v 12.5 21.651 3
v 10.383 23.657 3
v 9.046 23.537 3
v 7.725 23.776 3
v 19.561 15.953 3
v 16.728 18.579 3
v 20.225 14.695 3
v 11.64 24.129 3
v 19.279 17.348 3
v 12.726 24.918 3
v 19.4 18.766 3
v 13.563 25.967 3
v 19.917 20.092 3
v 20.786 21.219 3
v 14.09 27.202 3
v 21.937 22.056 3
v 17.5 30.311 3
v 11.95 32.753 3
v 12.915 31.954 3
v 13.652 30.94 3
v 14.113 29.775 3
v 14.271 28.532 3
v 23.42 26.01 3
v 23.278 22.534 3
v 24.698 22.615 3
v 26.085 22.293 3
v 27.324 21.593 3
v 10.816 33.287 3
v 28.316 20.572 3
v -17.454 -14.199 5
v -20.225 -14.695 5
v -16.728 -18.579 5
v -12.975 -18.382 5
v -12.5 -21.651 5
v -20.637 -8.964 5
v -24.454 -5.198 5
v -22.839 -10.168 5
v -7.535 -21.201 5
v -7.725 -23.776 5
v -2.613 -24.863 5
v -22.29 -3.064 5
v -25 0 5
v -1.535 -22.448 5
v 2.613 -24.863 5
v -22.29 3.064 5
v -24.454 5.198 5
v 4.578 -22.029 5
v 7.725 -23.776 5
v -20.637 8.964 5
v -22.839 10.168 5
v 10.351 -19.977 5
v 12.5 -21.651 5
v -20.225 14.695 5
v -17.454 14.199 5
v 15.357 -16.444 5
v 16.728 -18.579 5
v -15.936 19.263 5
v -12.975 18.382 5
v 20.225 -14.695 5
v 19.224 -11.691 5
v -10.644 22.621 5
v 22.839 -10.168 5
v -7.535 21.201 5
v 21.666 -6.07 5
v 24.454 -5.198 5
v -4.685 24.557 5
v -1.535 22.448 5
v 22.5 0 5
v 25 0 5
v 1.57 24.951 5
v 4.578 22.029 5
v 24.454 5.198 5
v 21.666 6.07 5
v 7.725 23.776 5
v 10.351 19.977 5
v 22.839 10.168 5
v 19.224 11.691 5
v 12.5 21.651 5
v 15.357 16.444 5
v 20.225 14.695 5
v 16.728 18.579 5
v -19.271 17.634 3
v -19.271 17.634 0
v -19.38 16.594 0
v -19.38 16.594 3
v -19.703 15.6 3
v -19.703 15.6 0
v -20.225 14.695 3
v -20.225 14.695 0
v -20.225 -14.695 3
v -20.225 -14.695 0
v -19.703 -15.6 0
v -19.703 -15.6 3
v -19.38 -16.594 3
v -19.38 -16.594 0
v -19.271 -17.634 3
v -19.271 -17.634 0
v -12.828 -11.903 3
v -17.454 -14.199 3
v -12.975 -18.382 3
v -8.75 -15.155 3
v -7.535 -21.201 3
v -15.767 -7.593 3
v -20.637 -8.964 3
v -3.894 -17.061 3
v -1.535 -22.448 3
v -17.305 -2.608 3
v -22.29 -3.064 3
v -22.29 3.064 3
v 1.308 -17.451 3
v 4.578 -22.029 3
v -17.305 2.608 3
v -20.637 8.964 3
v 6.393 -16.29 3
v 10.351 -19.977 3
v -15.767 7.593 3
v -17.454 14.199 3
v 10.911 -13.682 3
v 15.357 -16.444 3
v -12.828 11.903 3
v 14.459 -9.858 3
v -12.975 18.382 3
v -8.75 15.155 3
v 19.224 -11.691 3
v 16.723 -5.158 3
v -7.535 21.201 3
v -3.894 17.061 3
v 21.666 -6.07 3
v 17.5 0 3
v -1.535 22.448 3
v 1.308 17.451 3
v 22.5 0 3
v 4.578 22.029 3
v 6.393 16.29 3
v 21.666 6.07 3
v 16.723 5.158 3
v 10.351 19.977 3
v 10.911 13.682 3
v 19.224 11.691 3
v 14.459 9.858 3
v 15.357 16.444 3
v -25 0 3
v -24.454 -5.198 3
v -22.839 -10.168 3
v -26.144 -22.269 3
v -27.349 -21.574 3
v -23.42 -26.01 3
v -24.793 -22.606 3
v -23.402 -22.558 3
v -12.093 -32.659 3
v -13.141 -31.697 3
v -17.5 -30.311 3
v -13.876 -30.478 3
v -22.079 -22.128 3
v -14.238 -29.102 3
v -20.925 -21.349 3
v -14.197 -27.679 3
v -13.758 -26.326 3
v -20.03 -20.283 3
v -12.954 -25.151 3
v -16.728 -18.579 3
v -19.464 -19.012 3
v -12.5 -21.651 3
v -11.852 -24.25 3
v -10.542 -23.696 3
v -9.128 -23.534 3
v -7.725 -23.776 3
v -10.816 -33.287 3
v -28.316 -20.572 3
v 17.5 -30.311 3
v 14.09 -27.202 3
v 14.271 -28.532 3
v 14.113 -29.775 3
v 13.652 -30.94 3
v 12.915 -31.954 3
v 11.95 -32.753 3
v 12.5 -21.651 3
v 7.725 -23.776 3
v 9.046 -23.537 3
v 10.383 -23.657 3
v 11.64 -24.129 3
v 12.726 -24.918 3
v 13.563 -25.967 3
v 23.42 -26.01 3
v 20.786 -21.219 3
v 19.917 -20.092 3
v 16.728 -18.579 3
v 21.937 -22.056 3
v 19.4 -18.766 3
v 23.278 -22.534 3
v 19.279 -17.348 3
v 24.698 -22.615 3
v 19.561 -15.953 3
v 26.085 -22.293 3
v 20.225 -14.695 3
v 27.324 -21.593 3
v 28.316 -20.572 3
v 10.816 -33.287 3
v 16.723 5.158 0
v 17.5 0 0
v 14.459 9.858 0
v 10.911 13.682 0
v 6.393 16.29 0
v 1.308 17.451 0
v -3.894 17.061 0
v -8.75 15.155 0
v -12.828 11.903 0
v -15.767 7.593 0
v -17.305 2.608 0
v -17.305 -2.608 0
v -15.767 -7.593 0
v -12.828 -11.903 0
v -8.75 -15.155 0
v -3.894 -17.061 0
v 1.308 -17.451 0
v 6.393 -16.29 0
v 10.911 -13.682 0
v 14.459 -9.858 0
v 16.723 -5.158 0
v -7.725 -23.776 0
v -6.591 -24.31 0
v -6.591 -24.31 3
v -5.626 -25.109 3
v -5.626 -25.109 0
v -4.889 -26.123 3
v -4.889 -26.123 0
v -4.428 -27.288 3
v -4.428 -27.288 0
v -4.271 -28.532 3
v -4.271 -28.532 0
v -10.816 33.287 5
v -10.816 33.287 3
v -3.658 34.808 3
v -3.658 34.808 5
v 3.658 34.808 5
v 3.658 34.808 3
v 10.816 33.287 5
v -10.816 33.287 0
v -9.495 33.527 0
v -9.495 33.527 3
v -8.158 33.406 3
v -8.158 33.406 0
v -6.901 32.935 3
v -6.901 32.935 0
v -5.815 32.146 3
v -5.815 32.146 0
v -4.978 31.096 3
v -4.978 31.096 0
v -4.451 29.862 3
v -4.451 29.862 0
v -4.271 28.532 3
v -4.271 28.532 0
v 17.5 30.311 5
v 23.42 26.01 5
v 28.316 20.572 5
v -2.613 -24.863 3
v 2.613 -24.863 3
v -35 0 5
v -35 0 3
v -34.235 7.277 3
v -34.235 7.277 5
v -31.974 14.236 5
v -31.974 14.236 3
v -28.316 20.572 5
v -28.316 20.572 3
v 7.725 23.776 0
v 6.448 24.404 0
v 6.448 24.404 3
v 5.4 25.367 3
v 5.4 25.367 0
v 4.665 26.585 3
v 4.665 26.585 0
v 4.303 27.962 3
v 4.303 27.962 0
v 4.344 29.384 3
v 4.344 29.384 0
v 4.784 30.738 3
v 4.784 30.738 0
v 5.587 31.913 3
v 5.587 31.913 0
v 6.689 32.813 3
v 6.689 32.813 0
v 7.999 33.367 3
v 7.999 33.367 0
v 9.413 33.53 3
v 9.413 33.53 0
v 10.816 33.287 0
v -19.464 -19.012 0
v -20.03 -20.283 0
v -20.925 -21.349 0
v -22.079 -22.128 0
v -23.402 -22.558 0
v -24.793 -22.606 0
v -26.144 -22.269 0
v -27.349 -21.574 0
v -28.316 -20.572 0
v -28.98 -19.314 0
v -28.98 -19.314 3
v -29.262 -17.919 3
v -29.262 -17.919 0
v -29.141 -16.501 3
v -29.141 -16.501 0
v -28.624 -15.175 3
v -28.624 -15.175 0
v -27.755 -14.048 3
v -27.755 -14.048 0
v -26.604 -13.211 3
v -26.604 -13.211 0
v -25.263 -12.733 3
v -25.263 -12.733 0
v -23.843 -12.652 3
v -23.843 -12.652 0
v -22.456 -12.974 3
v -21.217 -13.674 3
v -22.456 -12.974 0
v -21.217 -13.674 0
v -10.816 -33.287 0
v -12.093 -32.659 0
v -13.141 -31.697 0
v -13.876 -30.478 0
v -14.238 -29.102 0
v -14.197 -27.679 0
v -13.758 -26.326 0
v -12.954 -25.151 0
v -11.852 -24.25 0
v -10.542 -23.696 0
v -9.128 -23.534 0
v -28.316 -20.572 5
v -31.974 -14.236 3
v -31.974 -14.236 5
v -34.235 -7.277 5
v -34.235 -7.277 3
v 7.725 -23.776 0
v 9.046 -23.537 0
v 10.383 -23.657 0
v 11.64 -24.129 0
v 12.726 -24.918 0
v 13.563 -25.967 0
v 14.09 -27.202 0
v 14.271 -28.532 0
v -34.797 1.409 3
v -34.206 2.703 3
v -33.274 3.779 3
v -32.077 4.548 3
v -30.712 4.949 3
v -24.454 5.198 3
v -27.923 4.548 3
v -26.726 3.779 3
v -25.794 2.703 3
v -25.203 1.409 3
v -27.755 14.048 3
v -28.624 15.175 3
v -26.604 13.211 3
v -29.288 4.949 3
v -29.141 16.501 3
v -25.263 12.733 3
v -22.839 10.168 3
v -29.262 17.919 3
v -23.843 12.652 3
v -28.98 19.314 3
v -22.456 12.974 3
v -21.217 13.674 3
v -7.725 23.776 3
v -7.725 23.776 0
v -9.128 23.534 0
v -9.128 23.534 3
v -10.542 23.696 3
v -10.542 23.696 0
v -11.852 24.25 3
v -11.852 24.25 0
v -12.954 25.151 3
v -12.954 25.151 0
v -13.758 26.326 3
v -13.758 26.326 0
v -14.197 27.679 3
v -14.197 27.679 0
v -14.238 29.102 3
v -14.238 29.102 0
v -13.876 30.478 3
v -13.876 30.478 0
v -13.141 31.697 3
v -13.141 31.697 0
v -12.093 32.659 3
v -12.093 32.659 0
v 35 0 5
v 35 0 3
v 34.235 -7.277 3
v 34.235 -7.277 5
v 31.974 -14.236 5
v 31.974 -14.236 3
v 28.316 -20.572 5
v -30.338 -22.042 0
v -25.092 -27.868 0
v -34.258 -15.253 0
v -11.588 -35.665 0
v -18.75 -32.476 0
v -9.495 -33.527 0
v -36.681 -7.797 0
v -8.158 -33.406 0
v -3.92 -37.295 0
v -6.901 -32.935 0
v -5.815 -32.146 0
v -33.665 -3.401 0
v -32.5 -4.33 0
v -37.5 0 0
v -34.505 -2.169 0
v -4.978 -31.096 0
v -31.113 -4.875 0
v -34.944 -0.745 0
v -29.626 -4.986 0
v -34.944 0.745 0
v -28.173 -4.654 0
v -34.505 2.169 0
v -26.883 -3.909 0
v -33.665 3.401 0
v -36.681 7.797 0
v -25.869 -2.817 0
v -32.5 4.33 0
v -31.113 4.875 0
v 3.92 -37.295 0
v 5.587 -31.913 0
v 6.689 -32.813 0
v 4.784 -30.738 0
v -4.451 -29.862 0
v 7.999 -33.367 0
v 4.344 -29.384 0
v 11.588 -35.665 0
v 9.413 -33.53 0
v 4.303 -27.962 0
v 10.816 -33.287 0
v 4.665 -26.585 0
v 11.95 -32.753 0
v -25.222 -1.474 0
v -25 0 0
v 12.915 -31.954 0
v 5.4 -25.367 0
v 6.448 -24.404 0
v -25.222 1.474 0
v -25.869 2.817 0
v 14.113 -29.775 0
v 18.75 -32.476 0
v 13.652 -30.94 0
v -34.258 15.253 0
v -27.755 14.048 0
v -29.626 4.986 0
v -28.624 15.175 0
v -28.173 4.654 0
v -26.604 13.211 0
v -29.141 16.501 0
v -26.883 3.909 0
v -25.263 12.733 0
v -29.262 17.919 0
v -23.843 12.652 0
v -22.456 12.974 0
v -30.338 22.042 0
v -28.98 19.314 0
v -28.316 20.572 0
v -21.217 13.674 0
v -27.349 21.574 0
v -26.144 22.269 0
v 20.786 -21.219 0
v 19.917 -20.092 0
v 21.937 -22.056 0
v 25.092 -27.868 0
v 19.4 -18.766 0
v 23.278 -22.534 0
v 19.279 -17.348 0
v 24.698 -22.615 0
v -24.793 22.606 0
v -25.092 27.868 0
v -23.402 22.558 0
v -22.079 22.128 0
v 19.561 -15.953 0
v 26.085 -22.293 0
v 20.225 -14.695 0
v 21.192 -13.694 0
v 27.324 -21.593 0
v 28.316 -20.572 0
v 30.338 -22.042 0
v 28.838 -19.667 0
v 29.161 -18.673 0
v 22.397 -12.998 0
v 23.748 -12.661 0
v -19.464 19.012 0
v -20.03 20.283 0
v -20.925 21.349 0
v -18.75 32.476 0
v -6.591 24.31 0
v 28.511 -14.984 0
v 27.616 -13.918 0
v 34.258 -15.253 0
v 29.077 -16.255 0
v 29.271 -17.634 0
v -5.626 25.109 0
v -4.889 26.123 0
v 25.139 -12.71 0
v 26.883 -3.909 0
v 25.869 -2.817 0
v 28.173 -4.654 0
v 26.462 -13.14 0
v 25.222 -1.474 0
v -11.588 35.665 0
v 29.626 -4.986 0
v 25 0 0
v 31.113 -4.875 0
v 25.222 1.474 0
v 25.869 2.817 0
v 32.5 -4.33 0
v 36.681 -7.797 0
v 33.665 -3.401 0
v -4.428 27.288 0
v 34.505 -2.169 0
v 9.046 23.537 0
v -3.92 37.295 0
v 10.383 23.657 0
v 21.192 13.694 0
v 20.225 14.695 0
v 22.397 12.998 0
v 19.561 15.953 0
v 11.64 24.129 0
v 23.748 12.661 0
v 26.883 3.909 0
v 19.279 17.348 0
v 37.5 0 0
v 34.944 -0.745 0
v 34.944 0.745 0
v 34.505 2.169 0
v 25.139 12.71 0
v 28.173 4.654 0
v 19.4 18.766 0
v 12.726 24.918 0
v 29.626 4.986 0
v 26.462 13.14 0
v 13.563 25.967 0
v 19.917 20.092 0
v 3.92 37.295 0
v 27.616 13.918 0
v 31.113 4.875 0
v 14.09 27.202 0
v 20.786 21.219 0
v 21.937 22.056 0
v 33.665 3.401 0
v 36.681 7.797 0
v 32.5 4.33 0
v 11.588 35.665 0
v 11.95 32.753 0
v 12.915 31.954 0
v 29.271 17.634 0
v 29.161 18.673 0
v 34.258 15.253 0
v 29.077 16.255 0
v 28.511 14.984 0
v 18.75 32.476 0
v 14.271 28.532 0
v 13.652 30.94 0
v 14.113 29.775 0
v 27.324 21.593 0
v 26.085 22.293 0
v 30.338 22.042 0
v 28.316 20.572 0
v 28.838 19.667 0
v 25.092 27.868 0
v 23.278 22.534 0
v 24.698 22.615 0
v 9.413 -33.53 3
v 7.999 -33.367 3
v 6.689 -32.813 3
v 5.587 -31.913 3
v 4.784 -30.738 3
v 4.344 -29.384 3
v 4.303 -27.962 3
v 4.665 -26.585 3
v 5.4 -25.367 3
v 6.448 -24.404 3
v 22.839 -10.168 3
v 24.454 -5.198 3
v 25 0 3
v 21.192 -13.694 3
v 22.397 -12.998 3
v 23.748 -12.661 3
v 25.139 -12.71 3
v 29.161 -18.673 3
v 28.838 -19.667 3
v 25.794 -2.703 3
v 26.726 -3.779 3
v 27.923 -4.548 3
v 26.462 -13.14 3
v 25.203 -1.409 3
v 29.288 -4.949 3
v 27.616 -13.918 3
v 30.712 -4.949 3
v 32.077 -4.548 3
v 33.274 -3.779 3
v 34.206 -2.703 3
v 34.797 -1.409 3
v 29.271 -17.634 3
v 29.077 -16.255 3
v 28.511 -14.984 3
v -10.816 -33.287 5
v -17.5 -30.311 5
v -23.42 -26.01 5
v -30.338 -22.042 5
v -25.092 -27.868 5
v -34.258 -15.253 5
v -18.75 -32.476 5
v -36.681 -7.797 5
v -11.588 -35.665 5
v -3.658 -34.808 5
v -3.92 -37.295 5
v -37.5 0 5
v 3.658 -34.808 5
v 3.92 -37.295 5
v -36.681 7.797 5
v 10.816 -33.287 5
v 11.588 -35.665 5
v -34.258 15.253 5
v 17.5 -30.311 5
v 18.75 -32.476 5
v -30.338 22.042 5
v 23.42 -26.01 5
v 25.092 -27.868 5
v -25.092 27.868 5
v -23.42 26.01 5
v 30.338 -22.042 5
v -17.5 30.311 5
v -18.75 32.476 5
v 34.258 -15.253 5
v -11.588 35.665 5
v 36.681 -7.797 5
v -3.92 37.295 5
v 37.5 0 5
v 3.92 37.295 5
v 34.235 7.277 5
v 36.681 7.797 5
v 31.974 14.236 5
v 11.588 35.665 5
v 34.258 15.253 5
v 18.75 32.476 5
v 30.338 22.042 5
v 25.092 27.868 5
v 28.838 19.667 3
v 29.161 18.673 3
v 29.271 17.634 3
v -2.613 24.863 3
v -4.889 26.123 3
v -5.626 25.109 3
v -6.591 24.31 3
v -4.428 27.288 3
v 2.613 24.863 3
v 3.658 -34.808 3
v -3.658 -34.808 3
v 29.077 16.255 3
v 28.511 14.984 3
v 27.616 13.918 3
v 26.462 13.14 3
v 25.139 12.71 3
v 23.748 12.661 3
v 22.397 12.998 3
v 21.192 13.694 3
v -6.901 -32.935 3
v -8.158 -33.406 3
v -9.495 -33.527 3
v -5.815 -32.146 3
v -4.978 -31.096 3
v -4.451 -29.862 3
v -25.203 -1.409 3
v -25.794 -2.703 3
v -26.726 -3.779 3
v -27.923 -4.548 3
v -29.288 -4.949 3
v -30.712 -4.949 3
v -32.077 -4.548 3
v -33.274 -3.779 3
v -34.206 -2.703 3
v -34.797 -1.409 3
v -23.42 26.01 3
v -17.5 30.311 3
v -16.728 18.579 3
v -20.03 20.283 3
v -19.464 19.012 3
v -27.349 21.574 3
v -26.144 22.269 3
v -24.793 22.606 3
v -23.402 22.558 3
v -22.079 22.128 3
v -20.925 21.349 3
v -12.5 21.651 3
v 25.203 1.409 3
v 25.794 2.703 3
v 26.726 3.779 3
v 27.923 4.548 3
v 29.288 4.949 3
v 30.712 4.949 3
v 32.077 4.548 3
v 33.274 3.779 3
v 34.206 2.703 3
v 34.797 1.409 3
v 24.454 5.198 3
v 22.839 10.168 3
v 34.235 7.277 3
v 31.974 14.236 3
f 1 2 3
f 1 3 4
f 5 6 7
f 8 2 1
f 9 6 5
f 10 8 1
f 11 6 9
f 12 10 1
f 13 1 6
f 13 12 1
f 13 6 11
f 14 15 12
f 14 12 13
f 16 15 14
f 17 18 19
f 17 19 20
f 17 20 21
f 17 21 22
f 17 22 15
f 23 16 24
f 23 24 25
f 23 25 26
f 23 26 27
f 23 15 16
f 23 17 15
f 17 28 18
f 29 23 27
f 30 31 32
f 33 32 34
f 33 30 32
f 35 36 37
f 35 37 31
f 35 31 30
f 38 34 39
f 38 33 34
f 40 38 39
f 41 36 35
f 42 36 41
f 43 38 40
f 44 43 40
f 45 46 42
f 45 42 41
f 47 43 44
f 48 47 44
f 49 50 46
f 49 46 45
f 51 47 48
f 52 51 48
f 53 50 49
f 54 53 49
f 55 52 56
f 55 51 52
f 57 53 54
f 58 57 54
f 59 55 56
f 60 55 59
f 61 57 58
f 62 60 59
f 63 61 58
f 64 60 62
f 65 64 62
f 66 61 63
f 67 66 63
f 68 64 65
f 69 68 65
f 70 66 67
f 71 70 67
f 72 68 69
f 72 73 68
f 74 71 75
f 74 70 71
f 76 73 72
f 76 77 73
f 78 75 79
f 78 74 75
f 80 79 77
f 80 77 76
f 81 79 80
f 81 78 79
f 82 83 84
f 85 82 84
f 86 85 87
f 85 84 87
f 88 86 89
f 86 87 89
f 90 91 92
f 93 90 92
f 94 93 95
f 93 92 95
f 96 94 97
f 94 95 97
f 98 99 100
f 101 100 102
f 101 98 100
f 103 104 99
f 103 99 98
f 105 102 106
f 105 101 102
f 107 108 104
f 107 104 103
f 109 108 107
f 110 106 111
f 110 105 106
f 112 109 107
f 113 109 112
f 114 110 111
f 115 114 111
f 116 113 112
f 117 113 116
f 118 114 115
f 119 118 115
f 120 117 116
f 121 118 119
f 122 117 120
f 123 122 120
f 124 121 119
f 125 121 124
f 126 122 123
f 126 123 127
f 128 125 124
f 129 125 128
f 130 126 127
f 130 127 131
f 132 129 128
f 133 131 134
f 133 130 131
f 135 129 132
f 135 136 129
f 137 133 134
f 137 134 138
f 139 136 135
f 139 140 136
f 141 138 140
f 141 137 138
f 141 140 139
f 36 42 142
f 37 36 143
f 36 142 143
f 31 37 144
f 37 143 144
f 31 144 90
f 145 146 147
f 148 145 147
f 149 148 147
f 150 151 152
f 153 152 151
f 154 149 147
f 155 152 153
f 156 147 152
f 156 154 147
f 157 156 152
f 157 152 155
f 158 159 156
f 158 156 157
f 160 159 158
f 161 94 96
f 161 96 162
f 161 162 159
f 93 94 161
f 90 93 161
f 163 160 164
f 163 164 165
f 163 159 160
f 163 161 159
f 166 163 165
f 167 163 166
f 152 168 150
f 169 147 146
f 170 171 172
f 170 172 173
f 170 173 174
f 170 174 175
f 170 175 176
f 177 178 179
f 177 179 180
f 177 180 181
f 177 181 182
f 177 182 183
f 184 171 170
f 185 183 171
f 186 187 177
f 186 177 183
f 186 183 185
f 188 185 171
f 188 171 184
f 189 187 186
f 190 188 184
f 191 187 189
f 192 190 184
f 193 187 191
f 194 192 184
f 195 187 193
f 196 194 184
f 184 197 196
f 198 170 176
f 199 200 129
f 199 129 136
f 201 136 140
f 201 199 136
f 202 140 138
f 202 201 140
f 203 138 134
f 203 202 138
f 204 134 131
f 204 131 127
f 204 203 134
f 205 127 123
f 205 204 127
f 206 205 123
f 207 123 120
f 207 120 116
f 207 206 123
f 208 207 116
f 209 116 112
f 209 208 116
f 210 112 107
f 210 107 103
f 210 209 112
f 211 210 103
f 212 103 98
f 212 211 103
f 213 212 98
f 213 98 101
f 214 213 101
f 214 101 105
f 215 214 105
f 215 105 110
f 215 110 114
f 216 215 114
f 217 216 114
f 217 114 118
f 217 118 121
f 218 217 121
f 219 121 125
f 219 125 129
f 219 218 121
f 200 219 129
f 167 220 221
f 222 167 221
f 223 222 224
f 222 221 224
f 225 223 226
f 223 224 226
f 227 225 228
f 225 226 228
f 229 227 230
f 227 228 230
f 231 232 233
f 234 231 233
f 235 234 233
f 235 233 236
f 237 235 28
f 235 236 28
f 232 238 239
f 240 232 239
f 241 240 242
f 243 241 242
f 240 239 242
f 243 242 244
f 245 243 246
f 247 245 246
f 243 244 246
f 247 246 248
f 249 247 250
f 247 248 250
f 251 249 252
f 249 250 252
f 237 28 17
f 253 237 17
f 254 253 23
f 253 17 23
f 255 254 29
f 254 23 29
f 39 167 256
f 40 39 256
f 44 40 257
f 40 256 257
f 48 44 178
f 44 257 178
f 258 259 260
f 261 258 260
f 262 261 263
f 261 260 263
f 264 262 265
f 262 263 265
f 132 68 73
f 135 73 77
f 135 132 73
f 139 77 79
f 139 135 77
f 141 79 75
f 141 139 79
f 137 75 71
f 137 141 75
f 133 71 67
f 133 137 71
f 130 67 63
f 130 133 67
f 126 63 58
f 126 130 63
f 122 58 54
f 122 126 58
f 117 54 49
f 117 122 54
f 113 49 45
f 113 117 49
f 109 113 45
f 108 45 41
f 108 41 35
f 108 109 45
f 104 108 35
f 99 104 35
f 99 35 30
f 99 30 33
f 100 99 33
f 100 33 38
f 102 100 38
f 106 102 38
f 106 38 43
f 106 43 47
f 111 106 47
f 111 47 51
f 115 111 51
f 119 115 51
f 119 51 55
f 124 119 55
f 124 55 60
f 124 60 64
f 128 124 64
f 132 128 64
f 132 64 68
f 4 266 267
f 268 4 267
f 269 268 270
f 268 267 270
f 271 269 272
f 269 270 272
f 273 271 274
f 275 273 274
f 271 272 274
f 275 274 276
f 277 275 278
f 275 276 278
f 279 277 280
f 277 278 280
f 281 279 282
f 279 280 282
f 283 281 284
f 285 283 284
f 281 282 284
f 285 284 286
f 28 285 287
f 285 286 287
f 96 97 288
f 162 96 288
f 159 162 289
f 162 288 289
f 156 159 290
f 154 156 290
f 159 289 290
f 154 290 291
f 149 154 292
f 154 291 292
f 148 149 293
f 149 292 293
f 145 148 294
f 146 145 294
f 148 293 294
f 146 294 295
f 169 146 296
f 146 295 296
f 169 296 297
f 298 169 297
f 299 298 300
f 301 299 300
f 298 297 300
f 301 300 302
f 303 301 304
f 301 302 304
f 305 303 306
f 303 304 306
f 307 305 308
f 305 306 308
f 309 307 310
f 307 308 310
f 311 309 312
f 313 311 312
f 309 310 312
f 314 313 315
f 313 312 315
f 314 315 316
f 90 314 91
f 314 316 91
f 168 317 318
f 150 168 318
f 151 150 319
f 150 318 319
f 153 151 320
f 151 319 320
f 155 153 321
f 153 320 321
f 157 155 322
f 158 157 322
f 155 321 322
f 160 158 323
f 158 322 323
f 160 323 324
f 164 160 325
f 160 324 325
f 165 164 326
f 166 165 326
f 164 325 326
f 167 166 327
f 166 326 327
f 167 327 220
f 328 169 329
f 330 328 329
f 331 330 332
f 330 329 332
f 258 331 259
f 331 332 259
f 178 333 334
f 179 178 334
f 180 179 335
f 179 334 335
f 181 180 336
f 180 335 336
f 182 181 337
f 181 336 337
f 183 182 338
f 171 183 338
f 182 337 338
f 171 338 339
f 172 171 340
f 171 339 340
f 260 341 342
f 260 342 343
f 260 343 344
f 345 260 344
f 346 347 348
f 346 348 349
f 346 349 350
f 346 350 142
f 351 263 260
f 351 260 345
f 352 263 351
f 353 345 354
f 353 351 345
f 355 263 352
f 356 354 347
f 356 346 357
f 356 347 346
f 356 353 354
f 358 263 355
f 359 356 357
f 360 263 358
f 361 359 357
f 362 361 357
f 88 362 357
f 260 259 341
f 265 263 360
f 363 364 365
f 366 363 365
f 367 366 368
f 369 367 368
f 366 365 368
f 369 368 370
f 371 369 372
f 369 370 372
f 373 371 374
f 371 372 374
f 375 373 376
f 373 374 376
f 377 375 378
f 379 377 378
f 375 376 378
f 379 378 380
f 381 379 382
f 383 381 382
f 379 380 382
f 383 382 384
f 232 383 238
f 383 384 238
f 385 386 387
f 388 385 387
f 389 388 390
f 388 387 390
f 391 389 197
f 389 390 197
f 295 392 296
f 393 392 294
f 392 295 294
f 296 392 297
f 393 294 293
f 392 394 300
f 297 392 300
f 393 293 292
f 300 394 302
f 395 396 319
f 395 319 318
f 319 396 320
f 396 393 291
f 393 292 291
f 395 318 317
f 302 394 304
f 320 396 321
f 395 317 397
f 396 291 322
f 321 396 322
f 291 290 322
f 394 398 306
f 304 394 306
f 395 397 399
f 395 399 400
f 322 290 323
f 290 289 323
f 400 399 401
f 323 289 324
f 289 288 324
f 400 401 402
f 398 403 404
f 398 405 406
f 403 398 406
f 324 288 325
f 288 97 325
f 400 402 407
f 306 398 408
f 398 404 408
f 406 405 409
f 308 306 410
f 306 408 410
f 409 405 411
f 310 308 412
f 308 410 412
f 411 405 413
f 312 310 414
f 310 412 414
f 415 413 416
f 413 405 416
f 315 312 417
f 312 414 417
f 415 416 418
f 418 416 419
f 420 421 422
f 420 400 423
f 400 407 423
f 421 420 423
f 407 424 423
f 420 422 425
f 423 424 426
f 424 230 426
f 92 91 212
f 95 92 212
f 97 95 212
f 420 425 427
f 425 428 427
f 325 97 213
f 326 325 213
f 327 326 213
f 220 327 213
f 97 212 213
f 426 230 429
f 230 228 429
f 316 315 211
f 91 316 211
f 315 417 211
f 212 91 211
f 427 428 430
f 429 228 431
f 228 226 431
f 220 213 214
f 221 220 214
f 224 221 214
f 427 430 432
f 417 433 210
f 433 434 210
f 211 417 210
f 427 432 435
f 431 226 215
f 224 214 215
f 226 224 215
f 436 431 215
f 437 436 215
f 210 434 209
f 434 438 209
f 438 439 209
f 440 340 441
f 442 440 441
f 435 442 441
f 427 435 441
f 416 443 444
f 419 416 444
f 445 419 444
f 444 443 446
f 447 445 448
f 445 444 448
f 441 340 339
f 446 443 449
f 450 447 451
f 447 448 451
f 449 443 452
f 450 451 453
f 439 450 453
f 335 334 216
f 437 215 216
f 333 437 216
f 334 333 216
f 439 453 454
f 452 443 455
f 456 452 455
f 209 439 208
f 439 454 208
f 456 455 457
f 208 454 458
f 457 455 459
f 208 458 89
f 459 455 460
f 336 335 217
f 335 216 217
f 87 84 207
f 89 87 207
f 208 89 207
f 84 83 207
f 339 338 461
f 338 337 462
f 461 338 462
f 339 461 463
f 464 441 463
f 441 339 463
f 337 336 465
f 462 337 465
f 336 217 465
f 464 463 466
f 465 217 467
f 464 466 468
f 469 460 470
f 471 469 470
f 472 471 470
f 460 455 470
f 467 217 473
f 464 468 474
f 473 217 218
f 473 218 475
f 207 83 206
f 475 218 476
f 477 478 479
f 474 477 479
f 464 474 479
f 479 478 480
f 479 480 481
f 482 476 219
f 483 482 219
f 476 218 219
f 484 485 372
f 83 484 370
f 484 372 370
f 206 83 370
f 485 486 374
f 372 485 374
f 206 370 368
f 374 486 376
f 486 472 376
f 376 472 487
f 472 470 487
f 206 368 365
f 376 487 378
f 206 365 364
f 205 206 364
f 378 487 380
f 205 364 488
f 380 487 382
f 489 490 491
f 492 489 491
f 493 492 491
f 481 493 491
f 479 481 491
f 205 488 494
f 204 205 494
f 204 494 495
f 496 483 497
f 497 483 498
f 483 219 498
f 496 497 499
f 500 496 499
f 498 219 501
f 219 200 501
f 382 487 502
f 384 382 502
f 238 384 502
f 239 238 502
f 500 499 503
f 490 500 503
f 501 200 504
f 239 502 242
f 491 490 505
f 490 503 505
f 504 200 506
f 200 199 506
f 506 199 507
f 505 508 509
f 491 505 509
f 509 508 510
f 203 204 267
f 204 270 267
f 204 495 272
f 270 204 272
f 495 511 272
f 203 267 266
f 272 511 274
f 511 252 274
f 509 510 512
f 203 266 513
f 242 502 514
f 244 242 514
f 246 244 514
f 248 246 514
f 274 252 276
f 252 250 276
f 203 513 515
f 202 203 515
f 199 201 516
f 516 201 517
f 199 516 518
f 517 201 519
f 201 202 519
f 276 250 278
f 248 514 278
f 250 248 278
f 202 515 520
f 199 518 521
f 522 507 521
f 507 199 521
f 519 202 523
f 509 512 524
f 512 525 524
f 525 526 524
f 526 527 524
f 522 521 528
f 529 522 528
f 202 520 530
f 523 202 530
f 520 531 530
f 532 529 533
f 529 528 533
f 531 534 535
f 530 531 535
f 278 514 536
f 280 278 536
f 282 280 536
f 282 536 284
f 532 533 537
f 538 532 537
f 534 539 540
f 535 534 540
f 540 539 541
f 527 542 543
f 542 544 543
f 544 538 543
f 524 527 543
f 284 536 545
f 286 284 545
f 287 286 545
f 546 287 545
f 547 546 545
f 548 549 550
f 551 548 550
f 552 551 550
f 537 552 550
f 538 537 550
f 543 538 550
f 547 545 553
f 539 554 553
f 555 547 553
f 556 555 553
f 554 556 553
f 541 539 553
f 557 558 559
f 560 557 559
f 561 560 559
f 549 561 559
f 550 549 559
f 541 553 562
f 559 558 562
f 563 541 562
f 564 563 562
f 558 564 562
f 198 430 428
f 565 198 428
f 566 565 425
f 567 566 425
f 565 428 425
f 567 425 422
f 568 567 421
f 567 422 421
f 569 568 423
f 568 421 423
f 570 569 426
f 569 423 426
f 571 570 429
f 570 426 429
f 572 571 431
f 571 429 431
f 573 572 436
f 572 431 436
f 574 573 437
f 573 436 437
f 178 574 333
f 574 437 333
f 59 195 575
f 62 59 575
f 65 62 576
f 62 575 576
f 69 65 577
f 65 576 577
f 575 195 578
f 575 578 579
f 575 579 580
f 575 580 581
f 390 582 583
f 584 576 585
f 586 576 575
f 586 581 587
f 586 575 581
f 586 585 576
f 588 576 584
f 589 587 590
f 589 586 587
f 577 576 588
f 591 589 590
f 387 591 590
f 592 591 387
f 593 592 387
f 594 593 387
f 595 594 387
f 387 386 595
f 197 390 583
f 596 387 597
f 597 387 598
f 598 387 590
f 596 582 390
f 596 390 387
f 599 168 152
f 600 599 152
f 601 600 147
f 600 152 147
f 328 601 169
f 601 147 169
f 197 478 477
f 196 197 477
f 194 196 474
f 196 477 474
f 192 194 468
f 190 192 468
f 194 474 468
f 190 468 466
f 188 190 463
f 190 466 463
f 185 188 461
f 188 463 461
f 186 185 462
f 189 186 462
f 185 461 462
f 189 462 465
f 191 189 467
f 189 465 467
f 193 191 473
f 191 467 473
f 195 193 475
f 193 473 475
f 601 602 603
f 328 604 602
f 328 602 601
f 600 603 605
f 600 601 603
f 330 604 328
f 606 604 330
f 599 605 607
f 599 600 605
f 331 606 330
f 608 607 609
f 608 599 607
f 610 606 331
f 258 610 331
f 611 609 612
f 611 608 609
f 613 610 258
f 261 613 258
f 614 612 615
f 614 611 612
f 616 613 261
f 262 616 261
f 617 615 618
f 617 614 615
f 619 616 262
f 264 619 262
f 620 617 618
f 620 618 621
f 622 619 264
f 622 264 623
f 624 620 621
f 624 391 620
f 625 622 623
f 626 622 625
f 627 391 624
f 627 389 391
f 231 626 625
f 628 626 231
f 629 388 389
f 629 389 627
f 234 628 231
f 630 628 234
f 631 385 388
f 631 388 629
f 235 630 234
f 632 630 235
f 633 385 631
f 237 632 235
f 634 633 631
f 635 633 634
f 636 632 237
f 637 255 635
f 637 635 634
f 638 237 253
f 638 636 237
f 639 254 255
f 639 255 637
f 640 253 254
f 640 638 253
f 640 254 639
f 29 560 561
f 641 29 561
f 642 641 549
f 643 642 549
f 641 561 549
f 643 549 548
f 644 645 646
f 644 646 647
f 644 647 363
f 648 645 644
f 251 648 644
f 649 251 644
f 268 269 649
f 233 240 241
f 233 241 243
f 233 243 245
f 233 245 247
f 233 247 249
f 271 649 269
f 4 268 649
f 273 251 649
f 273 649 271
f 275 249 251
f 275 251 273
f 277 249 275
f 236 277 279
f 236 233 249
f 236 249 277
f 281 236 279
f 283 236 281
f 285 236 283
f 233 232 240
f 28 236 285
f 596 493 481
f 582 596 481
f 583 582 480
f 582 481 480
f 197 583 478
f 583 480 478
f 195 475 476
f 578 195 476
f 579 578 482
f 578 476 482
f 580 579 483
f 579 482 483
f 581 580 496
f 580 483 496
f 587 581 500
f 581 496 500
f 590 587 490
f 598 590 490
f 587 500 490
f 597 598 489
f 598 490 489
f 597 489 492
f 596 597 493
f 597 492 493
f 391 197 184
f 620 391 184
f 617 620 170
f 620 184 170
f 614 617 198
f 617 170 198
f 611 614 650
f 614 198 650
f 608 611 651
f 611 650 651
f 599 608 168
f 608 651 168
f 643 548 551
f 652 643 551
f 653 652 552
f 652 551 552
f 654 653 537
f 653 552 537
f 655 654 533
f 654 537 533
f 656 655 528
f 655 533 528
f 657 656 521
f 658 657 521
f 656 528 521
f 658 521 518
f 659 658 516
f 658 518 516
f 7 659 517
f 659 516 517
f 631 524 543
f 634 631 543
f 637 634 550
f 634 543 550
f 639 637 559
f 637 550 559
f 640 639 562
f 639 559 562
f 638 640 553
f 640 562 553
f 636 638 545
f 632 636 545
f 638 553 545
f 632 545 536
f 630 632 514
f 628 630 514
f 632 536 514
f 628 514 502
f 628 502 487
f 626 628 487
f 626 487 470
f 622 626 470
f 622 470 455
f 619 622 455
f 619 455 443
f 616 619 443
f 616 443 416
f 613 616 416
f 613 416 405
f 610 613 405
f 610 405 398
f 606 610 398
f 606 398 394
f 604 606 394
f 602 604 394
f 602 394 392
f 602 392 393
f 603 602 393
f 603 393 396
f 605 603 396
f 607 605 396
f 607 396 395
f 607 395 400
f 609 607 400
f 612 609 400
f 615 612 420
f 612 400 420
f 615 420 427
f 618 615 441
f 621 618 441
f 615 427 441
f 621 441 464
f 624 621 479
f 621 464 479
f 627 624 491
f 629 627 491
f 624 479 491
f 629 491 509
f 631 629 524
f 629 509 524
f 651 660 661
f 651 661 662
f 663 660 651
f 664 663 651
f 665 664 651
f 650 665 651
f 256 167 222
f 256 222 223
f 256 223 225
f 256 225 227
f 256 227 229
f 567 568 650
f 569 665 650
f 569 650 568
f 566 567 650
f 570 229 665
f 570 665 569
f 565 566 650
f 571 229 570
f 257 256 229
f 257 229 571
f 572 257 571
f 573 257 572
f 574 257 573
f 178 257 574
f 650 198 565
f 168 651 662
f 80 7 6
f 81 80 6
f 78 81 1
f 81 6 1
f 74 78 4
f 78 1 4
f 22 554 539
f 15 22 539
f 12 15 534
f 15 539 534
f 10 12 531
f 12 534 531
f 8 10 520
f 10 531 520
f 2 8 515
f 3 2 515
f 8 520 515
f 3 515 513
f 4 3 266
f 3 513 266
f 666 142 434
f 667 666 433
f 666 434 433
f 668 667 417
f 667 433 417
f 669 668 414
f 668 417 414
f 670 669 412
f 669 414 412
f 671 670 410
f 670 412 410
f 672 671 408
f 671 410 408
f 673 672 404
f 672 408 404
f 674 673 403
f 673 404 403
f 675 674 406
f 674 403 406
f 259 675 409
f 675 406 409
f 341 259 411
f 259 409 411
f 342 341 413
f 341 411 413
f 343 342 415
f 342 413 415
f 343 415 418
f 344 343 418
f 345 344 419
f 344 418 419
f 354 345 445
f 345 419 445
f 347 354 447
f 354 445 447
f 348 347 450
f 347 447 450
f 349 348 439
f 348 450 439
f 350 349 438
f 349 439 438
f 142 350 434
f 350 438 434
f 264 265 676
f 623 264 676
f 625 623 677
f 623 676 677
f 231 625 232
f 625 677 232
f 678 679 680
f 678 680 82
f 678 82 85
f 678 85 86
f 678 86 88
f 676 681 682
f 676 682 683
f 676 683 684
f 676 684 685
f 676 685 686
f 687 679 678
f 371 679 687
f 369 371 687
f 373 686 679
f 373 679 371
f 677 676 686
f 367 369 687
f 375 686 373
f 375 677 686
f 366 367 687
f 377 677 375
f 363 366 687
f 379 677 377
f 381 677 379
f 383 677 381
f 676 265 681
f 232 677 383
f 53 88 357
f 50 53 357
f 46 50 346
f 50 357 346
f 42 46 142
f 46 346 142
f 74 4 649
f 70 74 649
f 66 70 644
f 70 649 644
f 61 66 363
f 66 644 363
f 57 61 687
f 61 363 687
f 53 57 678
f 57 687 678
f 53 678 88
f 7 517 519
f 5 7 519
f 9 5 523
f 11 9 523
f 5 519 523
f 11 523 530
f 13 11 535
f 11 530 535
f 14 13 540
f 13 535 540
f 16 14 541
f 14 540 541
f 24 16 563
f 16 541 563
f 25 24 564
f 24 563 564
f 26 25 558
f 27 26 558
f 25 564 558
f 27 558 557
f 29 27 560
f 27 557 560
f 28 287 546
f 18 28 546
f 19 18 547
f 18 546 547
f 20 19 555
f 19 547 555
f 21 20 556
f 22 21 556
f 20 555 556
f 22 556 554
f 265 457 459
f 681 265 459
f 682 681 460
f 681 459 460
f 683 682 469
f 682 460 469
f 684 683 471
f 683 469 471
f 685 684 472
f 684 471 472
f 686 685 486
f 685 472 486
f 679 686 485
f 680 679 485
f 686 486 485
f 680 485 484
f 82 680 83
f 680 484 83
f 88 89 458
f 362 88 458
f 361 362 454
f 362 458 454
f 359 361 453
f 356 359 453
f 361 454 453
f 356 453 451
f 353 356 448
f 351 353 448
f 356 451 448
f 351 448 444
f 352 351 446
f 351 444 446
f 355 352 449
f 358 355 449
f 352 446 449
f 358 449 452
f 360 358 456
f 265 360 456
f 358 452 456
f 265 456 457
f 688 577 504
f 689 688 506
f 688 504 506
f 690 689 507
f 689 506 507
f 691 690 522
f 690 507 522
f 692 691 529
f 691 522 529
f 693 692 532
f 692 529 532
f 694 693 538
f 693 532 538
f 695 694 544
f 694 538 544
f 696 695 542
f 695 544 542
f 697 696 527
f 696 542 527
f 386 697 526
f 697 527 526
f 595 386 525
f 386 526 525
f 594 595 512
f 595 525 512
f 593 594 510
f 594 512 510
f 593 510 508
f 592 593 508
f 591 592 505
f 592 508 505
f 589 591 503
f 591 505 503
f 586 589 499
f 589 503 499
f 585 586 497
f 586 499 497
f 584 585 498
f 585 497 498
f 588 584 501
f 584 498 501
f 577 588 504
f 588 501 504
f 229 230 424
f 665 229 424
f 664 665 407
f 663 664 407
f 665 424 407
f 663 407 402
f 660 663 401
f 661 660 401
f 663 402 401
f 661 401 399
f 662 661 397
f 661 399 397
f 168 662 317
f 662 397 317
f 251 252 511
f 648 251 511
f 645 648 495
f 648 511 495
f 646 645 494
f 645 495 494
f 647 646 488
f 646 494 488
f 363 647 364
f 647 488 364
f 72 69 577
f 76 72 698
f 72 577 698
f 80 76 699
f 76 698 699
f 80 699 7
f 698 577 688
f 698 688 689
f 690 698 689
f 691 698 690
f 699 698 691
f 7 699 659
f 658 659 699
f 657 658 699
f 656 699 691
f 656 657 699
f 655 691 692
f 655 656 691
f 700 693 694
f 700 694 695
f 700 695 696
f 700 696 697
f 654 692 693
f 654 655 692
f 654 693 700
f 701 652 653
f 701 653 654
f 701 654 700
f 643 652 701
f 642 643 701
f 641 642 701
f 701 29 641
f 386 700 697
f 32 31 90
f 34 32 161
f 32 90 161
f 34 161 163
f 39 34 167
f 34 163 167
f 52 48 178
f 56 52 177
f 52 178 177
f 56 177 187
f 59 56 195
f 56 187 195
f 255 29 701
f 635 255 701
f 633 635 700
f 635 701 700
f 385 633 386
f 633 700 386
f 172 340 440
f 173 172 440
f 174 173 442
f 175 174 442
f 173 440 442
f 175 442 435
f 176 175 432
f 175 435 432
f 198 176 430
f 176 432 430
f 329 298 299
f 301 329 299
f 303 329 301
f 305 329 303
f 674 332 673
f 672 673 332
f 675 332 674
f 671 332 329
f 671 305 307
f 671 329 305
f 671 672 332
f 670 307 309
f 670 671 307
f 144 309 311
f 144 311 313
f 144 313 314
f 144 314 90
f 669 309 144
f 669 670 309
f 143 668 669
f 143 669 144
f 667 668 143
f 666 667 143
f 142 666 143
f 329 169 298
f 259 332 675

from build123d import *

# Parameters (mm, degrees)
F0_R     = 37.5
F0_R_2   = 22.5
F0_R_3   = 17.5
F1_DEPTH = 3
F2_DEPTH = 5


with BuildPart() as f1:
    # F0 (on Top) → F1 (new body)
    with BuildSketch(Plane.XY):
        Circle(F0_R)
        with BuildLine():
            ThreePointArc((28.3155948478, 20.5724837687), (33.2869780821, 10.8155947669), (35, 0))
            ThreePointArc((35, 0), (33.2869780821, -10.8155947669), (28.3155948478, -20.5724837687))
            ThreePointArc((28.3155948478, -20.5724837687), (20.5724838991, -28.3155947531), (10.8155948928, -33.2869780412))
            ThreePointArc((10.8155948928, -33.2869780412), (-9.47e-08, -35), (-10.8155950729, -33.2869779827))
            ThreePointArc((-10.8155950729, -33.2869779827), (-20.572483954, -28.3155947132), (-28.3155948162, -20.5724838122))
            ThreePointArc((-28.3155948162, -20.5724838122), (-33.2869780844, -10.8155947599), (-35, 6.87e-08))
            ThreePointArc((-35, 6.87e-08), (-33.286978055, 10.8155948504), (-28.3155947851, 20.572483855))
            ThreePointArc((-28.3155947851, 20.572483855), (-20.572483856, 28.3155947844), (-10.8155948928, 33.2869780412))
            ThreePointArc((-10.8155948928, 33.2869780412), (-5.37e-08, 35), (10.8155947907, 33.2869780744))
            ThreePointArc((10.8155947907, 33.2869780744), (20.5724838557, 28.3155947846), (28.3155948478, 20.5724837687))
        make_face(mode=Mode.SUBTRACT)
        with BuildLine():
            ThreePointArc((20.225424834, -14.6946313422), (23.7764129007, -7.7254248799), (25, 0))
            ThreePointArc((25, 0), (23.7764129114, 7.725424847), (20.2254248747, 14.6946312863))
            ThreePointArc((20.2254248747, 14.6946312863), (14.6946312563, 20.2254248964), (7.7254247148, 23.7764129544))
            ThreePointArc((7.7254247148, 23.7764129544), (-1.398e-07, 25), (-7.7254249808, 23.7764128679))
            ThreePointArc((-7.7254249808, 23.7764128679), (-14.6946313415, 20.2254248345), (-20.225424834, 14.6946313422))
            ThreePointArc((-20.225424834, 14.6946313422), (-23.7764129007, 7.7254248799), (-25, 0))
            ThreePointArc((-25, 0), (-23.7764129337, -7.7254247782), (-20.2254249597, -14.6946311693))
            ThreePointArc((-20.2254249597, -14.6946311693), (-14.694631428, -20.2254247717), (-7.7254249808, -23.7764128679))
            ThreePointArc((-7.7254249808, -23.7764128679), (1.09e-08, -25), (7.7254250015, -23.7764128612))
            ThreePointArc((7.7254250015, -23.7764128612), (14.6946313503, -20.2254248281), (20.225424834, -14.6946313422))
        make_face()
        Circle(F0_R_2, mode=Mode.SUBTRACT)
        Circle(F0_R_2)
        Circle(F0_R_3, mode=Mode.SUBTRACT)
        with BuildLine():
            ThreePointArc((10.8155948928, -33.2869780412), (4.5152272412, -30.0767804345), (7.7254250015, -23.7764128612))
            ThreePointArc((7.7254250015, -23.7764128612), (1.09e-08, -25), (-7.7254249808, -23.7764128679))
            ThreePointArc((-7.7254249808, -23.7764128679), (-5.2254248969, -25.5927691757), (-4.2705098312, -28.5316954889))
            ThreePointArc((-4.2705098312, -28.5316954889), (-6.3315836845, -32.5767805441), (-10.8155950729, -33.2869779827))
            ThreePointArc((-10.8155950729, -33.2869779827), (-9.47e-08, -35), (10.8155948928, -33.2869780412))
        make_face()
        with BuildLine():
            ThreePointArc((28.3155948478, -20.5724837687), (21.331583618, -21.6786425757), (20.225424834, -14.6946313422))
            ThreePointArc((20.225424834, -14.6946313422), (14.6946313503, -20.2254248281), (7.7254250015, -23.7764128612))
            ThreePointArc((7.7254250015, -23.7764128612), (12.2094361532, -24.4866105609), (14.2705098312, -28.5316954889))
            ThreePointArc((14.2705098312, -28.5316954889), (13.3155948308, -31.4706217122), (10.8155948928, -33.2869780412))
            ThreePointArc((10.8155948928, -33.2869780412), (20.5724838991, -28.3155947531), (28.3155948478, -20.5724837687))
        make_face()
        with BuildLine():
            ThreePointArc((35, 0), (30, -5), (25, 0))
            ThreePointArc((25, 0), (23.7764129007, -7.7254248799), (20.225424834, -14.6946313422))
            ThreePointArc((20.225424834, -14.6946313422), (25.8155947826, -12.8782749806), (29.2705098312, -17.6335575688))
            ThreePointArc((29.2705098312, -17.6335575688), (29.0257924245, -19.1786425045), (28.3155948478, -20.5724837687))
            ThreePointArc((28.3155948478, -20.5724837687), (33.2869780821, -10.8155947669), (35, 0))
        make_face()
        with BuildLine():
            ThreePointArc((20.2254248747, 14.6946312863), (23.7764129114, 7.725424847), (25, 0))
            ThreePointArc((25, 0), (30, 5), (35, 0))
            ThreePointArc((35, 0), (33.2869780821, 10.8155947669), (28.3155948478, 20.5724837687))
            ThreePointArc((28.3155948478, 20.5724837687), (29.0257924245, 19.1786425045), (29.2705098312, 17.6335575688))
            ThreePointArc((29.2705098312, 17.6335575688), (25.8155948155, 12.8782749913), (20.2254248747, 14.6946312863))
        make_face()
        with BuildLine():
            ThreePointArc((7.7254247148, 23.7764129544), (14.6946312563, 20.2254248964), (20.2254248747, 14.6946312863))
            ThreePointArc((20.2254248747, 14.6946312863), (21.33158359, 21.6786425554), (28.3155948478, 20.5724837687))
            ThreePointArc((28.3155948478, 20.5724837687), (20.5724838557, 28.3155947846), (10.8155947907, 33.2869780744))
            ThreePointArc((10.8155947907, 33.2869780744), (13.3155947993, 31.4706217556), (14.2705098312, 28.5316954889))
            ThreePointArc((14.2705098312, 28.5316954889), (12.2094360312, 24.4866104723), (7.7254247148, 23.7764129544))
        make_face()
        with BuildLine():
            ThreePointArc((-7.7254249808, 23.7764128679), (-1.398e-07, 25), (7.7254247148, 23.7764129544))
            ThreePointArc((7.7254247148, 23.7764129544), (4.5152272712, 30.0767805268), (10.8155947907, 33.2869780744))
            ThreePointArc((10.8155947907, 33.2869780744), (-5.37e-08, 35), (-10.8155948928, 33.2869780412))
            ThreePointArc((-10.8155948928, 33.2869780412), (-6.3315836079, 32.5767804884), (-4.2705098312, 28.5316954889))
            ThreePointArc((-4.2705098312, 28.5316954889), (-5.2254248969, 25.5927691758), (-7.7254249808, 23.7764128679))
        make_face()
        with BuildLine():
            ThreePointArc((-20.225424834, 14.6946313422), (-14.6946313415, 20.2254248345), (-7.7254249808, 23.7764128679))
            ThreePointArc((-7.7254249808, 23.7764128679), (-14.0257924179, 26.9866105329), (-10.8155948928, 33.2869780412))
            ThreePointArc((-10.8155948928, 33.2869780412), (-20.572483856, 28.3155947844), (-28.3155947851, 20.572483855))
            ThreePointArc((-28.3155947851, 20.572483855), (-22.7254248448, 22.3888401455), (-19.2705098312, 17.6335575688))
            ThreePointArc((-19.2705098312, 17.6335575688), (-19.5152272431, 16.0884726174), (-20.225424834, 14.6946313422))
        make_face()
        with BuildLine():
            ThreePointArc((-25, 0), (-23.7764129007, 7.7254248799), (-20.225424834, 14.6946313422))
            ThreePointArc((-20.225424834, 14.6946313422), (-27.2094360876, 13.5884725932), (-28.3155947851, 20.572483855))
            ThreePointArc((-28.3155947851, 20.572483855), (-33.286978055, 10.8155948504), (-35, 6.87e-08))
            ThreePointArc((-35, 6.87e-08), (-29.9999999656, 5), (-25, 0))
        make_face()
        with BuildLine():
            ThreePointArc((-10.8155950729, -33.2869779827), (-14.0257923886, -26.9866104428), (-7.7254249808, -23.7764128679))
            ThreePointArc((-7.7254249808, -23.7764128679), (-14.694631428, -20.2254247717), (-20.2254249597, -14.6946311693))
            ThreePointArc((-20.2254249597, -14.6946311693), (-19.5152272761, -16.0884725158), (-19.2705098312, -17.6335575688))
            ThreePointArc((-19.2705098312, -17.6335575688), (-22.72542487, -22.3888401537), (-28.3155948162, -20.5724838122))
            ThreePointArc((-28.3155948162, -20.5724838122), (-20.572483954, -28.3155947132), (-10.8155950729, -33.2869779827))
        make_face()
        with BuildLine():
            ThreePointArc((-28.3155948162, -20.5724838122), (-27.2094361527, -13.5884726405), (-20.2254249597, -14.6946311693))
            ThreePointArc((-20.2254249597, -14.6946311693), (-23.7764129337, -7.7254247782), (-25, 0))
            ThreePointArc((-25, 0), (-30.0000000344, -5), (-35, 6.87e-08))
            ThreePointArc((-35, 6.87e-08), (-33.2869780844, -10.8155947599), (-28.3155948162, -20.5724838122))
        make_face()
    extrude(amount=F1_DEPTH)

    # F0 (on Top) → F2 (join)
    with BuildSketch(Plane.XY):
        Circle(F0_R)
        with BuildLine():
            ThreePointArc((28.3155948478, 20.5724837687), (33.2869780821, 10.8155947669), (35, 0))
            ThreePointArc((35, 0), (33.2869780821, -10.8155947669), (28.3155948478, -20.5724837687))
            ThreePointArc((28.3155948478, -20.5724837687), (20.5724838991, -28.3155947531), (10.8155948928, -33.2869780412))
            ThreePointArc((10.8155948928, -33.2869780412), (-9.47e-08, -35), (-10.8155950729, -33.2869779827))
            ThreePointArc((-10.8155950729, -33.2869779827), (-20.572483954, -28.3155947132), (-28.3155948162, -20.5724838122))
            ThreePointArc((-28.3155948162, -20.5724838122), (-33.2869780844, -10.8155947599), (-35, 6.87e-08))
            ThreePointArc((-35, 6.87e-08), (-33.286978055, 10.8155948504), (-28.3155947851, 20.572483855))
            ThreePointArc((-28.3155947851, 20.572483855), (-20.572483856, 28.3155947844), (-10.8155948928, 33.2869780412))
            ThreePointArc((-10.8155948928, 33.2869780412), (-5.37e-08, 35), (10.8155947907, 33.2869780744))
            ThreePointArc((10.8155947907, 33.2869780744), (20.5724838557, 28.3155947846), (28.3155948478, 20.5724837687))
        make_face(mode=Mode.SUBTRACT)
        with BuildLine():
            ThreePointArc((20.225424834, -14.6946313422), (23.7764129007, -7.7254248799), (25, 0))
            ThreePointArc((25, 0), (23.7764129114, 7.725424847), (20.2254248747, 14.6946312863))
            ThreePointArc((20.2254248747, 14.6946312863), (14.6946312563, 20.2254248964), (7.7254247148, 23.7764129544))
            ThreePointArc((7.7254247148, 23.7764129544), (-1.398e-07, 25), (-7.7254249808, 23.7764128679))
            ThreePointArc((-7.7254249808, 23.7764128679), (-14.6946313415, 20.2254248345), (-20.225424834, 14.6946313422))
            ThreePointArc((-20.225424834, 14.6946313422), (-23.7764129007, 7.7254248799), (-25, 0))
            ThreePointArc((-25, 0), (-23.7764129337, -7.7254247782), (-20.2254249597, -14.6946311693))
            ThreePointArc((-20.2254249597, -14.6946311693), (-14.694631428, -20.2254247717), (-7.7254249808, -23.7764128679))
            ThreePointArc((-7.7254249808, -23.7764128679), (1.09e-08, -25), (7.7254250015, -23.7764128612))
            ThreePointArc((7.7254250015, -23.7764128612), (14.6946313503, -20.2254248281), (20.225424834, -14.6946313422))
        make_face()
        Circle(F0_R_2, mode=Mode.SUBTRACT)
    extrude(amount=F2_DEPTH)


solid = f1.part
